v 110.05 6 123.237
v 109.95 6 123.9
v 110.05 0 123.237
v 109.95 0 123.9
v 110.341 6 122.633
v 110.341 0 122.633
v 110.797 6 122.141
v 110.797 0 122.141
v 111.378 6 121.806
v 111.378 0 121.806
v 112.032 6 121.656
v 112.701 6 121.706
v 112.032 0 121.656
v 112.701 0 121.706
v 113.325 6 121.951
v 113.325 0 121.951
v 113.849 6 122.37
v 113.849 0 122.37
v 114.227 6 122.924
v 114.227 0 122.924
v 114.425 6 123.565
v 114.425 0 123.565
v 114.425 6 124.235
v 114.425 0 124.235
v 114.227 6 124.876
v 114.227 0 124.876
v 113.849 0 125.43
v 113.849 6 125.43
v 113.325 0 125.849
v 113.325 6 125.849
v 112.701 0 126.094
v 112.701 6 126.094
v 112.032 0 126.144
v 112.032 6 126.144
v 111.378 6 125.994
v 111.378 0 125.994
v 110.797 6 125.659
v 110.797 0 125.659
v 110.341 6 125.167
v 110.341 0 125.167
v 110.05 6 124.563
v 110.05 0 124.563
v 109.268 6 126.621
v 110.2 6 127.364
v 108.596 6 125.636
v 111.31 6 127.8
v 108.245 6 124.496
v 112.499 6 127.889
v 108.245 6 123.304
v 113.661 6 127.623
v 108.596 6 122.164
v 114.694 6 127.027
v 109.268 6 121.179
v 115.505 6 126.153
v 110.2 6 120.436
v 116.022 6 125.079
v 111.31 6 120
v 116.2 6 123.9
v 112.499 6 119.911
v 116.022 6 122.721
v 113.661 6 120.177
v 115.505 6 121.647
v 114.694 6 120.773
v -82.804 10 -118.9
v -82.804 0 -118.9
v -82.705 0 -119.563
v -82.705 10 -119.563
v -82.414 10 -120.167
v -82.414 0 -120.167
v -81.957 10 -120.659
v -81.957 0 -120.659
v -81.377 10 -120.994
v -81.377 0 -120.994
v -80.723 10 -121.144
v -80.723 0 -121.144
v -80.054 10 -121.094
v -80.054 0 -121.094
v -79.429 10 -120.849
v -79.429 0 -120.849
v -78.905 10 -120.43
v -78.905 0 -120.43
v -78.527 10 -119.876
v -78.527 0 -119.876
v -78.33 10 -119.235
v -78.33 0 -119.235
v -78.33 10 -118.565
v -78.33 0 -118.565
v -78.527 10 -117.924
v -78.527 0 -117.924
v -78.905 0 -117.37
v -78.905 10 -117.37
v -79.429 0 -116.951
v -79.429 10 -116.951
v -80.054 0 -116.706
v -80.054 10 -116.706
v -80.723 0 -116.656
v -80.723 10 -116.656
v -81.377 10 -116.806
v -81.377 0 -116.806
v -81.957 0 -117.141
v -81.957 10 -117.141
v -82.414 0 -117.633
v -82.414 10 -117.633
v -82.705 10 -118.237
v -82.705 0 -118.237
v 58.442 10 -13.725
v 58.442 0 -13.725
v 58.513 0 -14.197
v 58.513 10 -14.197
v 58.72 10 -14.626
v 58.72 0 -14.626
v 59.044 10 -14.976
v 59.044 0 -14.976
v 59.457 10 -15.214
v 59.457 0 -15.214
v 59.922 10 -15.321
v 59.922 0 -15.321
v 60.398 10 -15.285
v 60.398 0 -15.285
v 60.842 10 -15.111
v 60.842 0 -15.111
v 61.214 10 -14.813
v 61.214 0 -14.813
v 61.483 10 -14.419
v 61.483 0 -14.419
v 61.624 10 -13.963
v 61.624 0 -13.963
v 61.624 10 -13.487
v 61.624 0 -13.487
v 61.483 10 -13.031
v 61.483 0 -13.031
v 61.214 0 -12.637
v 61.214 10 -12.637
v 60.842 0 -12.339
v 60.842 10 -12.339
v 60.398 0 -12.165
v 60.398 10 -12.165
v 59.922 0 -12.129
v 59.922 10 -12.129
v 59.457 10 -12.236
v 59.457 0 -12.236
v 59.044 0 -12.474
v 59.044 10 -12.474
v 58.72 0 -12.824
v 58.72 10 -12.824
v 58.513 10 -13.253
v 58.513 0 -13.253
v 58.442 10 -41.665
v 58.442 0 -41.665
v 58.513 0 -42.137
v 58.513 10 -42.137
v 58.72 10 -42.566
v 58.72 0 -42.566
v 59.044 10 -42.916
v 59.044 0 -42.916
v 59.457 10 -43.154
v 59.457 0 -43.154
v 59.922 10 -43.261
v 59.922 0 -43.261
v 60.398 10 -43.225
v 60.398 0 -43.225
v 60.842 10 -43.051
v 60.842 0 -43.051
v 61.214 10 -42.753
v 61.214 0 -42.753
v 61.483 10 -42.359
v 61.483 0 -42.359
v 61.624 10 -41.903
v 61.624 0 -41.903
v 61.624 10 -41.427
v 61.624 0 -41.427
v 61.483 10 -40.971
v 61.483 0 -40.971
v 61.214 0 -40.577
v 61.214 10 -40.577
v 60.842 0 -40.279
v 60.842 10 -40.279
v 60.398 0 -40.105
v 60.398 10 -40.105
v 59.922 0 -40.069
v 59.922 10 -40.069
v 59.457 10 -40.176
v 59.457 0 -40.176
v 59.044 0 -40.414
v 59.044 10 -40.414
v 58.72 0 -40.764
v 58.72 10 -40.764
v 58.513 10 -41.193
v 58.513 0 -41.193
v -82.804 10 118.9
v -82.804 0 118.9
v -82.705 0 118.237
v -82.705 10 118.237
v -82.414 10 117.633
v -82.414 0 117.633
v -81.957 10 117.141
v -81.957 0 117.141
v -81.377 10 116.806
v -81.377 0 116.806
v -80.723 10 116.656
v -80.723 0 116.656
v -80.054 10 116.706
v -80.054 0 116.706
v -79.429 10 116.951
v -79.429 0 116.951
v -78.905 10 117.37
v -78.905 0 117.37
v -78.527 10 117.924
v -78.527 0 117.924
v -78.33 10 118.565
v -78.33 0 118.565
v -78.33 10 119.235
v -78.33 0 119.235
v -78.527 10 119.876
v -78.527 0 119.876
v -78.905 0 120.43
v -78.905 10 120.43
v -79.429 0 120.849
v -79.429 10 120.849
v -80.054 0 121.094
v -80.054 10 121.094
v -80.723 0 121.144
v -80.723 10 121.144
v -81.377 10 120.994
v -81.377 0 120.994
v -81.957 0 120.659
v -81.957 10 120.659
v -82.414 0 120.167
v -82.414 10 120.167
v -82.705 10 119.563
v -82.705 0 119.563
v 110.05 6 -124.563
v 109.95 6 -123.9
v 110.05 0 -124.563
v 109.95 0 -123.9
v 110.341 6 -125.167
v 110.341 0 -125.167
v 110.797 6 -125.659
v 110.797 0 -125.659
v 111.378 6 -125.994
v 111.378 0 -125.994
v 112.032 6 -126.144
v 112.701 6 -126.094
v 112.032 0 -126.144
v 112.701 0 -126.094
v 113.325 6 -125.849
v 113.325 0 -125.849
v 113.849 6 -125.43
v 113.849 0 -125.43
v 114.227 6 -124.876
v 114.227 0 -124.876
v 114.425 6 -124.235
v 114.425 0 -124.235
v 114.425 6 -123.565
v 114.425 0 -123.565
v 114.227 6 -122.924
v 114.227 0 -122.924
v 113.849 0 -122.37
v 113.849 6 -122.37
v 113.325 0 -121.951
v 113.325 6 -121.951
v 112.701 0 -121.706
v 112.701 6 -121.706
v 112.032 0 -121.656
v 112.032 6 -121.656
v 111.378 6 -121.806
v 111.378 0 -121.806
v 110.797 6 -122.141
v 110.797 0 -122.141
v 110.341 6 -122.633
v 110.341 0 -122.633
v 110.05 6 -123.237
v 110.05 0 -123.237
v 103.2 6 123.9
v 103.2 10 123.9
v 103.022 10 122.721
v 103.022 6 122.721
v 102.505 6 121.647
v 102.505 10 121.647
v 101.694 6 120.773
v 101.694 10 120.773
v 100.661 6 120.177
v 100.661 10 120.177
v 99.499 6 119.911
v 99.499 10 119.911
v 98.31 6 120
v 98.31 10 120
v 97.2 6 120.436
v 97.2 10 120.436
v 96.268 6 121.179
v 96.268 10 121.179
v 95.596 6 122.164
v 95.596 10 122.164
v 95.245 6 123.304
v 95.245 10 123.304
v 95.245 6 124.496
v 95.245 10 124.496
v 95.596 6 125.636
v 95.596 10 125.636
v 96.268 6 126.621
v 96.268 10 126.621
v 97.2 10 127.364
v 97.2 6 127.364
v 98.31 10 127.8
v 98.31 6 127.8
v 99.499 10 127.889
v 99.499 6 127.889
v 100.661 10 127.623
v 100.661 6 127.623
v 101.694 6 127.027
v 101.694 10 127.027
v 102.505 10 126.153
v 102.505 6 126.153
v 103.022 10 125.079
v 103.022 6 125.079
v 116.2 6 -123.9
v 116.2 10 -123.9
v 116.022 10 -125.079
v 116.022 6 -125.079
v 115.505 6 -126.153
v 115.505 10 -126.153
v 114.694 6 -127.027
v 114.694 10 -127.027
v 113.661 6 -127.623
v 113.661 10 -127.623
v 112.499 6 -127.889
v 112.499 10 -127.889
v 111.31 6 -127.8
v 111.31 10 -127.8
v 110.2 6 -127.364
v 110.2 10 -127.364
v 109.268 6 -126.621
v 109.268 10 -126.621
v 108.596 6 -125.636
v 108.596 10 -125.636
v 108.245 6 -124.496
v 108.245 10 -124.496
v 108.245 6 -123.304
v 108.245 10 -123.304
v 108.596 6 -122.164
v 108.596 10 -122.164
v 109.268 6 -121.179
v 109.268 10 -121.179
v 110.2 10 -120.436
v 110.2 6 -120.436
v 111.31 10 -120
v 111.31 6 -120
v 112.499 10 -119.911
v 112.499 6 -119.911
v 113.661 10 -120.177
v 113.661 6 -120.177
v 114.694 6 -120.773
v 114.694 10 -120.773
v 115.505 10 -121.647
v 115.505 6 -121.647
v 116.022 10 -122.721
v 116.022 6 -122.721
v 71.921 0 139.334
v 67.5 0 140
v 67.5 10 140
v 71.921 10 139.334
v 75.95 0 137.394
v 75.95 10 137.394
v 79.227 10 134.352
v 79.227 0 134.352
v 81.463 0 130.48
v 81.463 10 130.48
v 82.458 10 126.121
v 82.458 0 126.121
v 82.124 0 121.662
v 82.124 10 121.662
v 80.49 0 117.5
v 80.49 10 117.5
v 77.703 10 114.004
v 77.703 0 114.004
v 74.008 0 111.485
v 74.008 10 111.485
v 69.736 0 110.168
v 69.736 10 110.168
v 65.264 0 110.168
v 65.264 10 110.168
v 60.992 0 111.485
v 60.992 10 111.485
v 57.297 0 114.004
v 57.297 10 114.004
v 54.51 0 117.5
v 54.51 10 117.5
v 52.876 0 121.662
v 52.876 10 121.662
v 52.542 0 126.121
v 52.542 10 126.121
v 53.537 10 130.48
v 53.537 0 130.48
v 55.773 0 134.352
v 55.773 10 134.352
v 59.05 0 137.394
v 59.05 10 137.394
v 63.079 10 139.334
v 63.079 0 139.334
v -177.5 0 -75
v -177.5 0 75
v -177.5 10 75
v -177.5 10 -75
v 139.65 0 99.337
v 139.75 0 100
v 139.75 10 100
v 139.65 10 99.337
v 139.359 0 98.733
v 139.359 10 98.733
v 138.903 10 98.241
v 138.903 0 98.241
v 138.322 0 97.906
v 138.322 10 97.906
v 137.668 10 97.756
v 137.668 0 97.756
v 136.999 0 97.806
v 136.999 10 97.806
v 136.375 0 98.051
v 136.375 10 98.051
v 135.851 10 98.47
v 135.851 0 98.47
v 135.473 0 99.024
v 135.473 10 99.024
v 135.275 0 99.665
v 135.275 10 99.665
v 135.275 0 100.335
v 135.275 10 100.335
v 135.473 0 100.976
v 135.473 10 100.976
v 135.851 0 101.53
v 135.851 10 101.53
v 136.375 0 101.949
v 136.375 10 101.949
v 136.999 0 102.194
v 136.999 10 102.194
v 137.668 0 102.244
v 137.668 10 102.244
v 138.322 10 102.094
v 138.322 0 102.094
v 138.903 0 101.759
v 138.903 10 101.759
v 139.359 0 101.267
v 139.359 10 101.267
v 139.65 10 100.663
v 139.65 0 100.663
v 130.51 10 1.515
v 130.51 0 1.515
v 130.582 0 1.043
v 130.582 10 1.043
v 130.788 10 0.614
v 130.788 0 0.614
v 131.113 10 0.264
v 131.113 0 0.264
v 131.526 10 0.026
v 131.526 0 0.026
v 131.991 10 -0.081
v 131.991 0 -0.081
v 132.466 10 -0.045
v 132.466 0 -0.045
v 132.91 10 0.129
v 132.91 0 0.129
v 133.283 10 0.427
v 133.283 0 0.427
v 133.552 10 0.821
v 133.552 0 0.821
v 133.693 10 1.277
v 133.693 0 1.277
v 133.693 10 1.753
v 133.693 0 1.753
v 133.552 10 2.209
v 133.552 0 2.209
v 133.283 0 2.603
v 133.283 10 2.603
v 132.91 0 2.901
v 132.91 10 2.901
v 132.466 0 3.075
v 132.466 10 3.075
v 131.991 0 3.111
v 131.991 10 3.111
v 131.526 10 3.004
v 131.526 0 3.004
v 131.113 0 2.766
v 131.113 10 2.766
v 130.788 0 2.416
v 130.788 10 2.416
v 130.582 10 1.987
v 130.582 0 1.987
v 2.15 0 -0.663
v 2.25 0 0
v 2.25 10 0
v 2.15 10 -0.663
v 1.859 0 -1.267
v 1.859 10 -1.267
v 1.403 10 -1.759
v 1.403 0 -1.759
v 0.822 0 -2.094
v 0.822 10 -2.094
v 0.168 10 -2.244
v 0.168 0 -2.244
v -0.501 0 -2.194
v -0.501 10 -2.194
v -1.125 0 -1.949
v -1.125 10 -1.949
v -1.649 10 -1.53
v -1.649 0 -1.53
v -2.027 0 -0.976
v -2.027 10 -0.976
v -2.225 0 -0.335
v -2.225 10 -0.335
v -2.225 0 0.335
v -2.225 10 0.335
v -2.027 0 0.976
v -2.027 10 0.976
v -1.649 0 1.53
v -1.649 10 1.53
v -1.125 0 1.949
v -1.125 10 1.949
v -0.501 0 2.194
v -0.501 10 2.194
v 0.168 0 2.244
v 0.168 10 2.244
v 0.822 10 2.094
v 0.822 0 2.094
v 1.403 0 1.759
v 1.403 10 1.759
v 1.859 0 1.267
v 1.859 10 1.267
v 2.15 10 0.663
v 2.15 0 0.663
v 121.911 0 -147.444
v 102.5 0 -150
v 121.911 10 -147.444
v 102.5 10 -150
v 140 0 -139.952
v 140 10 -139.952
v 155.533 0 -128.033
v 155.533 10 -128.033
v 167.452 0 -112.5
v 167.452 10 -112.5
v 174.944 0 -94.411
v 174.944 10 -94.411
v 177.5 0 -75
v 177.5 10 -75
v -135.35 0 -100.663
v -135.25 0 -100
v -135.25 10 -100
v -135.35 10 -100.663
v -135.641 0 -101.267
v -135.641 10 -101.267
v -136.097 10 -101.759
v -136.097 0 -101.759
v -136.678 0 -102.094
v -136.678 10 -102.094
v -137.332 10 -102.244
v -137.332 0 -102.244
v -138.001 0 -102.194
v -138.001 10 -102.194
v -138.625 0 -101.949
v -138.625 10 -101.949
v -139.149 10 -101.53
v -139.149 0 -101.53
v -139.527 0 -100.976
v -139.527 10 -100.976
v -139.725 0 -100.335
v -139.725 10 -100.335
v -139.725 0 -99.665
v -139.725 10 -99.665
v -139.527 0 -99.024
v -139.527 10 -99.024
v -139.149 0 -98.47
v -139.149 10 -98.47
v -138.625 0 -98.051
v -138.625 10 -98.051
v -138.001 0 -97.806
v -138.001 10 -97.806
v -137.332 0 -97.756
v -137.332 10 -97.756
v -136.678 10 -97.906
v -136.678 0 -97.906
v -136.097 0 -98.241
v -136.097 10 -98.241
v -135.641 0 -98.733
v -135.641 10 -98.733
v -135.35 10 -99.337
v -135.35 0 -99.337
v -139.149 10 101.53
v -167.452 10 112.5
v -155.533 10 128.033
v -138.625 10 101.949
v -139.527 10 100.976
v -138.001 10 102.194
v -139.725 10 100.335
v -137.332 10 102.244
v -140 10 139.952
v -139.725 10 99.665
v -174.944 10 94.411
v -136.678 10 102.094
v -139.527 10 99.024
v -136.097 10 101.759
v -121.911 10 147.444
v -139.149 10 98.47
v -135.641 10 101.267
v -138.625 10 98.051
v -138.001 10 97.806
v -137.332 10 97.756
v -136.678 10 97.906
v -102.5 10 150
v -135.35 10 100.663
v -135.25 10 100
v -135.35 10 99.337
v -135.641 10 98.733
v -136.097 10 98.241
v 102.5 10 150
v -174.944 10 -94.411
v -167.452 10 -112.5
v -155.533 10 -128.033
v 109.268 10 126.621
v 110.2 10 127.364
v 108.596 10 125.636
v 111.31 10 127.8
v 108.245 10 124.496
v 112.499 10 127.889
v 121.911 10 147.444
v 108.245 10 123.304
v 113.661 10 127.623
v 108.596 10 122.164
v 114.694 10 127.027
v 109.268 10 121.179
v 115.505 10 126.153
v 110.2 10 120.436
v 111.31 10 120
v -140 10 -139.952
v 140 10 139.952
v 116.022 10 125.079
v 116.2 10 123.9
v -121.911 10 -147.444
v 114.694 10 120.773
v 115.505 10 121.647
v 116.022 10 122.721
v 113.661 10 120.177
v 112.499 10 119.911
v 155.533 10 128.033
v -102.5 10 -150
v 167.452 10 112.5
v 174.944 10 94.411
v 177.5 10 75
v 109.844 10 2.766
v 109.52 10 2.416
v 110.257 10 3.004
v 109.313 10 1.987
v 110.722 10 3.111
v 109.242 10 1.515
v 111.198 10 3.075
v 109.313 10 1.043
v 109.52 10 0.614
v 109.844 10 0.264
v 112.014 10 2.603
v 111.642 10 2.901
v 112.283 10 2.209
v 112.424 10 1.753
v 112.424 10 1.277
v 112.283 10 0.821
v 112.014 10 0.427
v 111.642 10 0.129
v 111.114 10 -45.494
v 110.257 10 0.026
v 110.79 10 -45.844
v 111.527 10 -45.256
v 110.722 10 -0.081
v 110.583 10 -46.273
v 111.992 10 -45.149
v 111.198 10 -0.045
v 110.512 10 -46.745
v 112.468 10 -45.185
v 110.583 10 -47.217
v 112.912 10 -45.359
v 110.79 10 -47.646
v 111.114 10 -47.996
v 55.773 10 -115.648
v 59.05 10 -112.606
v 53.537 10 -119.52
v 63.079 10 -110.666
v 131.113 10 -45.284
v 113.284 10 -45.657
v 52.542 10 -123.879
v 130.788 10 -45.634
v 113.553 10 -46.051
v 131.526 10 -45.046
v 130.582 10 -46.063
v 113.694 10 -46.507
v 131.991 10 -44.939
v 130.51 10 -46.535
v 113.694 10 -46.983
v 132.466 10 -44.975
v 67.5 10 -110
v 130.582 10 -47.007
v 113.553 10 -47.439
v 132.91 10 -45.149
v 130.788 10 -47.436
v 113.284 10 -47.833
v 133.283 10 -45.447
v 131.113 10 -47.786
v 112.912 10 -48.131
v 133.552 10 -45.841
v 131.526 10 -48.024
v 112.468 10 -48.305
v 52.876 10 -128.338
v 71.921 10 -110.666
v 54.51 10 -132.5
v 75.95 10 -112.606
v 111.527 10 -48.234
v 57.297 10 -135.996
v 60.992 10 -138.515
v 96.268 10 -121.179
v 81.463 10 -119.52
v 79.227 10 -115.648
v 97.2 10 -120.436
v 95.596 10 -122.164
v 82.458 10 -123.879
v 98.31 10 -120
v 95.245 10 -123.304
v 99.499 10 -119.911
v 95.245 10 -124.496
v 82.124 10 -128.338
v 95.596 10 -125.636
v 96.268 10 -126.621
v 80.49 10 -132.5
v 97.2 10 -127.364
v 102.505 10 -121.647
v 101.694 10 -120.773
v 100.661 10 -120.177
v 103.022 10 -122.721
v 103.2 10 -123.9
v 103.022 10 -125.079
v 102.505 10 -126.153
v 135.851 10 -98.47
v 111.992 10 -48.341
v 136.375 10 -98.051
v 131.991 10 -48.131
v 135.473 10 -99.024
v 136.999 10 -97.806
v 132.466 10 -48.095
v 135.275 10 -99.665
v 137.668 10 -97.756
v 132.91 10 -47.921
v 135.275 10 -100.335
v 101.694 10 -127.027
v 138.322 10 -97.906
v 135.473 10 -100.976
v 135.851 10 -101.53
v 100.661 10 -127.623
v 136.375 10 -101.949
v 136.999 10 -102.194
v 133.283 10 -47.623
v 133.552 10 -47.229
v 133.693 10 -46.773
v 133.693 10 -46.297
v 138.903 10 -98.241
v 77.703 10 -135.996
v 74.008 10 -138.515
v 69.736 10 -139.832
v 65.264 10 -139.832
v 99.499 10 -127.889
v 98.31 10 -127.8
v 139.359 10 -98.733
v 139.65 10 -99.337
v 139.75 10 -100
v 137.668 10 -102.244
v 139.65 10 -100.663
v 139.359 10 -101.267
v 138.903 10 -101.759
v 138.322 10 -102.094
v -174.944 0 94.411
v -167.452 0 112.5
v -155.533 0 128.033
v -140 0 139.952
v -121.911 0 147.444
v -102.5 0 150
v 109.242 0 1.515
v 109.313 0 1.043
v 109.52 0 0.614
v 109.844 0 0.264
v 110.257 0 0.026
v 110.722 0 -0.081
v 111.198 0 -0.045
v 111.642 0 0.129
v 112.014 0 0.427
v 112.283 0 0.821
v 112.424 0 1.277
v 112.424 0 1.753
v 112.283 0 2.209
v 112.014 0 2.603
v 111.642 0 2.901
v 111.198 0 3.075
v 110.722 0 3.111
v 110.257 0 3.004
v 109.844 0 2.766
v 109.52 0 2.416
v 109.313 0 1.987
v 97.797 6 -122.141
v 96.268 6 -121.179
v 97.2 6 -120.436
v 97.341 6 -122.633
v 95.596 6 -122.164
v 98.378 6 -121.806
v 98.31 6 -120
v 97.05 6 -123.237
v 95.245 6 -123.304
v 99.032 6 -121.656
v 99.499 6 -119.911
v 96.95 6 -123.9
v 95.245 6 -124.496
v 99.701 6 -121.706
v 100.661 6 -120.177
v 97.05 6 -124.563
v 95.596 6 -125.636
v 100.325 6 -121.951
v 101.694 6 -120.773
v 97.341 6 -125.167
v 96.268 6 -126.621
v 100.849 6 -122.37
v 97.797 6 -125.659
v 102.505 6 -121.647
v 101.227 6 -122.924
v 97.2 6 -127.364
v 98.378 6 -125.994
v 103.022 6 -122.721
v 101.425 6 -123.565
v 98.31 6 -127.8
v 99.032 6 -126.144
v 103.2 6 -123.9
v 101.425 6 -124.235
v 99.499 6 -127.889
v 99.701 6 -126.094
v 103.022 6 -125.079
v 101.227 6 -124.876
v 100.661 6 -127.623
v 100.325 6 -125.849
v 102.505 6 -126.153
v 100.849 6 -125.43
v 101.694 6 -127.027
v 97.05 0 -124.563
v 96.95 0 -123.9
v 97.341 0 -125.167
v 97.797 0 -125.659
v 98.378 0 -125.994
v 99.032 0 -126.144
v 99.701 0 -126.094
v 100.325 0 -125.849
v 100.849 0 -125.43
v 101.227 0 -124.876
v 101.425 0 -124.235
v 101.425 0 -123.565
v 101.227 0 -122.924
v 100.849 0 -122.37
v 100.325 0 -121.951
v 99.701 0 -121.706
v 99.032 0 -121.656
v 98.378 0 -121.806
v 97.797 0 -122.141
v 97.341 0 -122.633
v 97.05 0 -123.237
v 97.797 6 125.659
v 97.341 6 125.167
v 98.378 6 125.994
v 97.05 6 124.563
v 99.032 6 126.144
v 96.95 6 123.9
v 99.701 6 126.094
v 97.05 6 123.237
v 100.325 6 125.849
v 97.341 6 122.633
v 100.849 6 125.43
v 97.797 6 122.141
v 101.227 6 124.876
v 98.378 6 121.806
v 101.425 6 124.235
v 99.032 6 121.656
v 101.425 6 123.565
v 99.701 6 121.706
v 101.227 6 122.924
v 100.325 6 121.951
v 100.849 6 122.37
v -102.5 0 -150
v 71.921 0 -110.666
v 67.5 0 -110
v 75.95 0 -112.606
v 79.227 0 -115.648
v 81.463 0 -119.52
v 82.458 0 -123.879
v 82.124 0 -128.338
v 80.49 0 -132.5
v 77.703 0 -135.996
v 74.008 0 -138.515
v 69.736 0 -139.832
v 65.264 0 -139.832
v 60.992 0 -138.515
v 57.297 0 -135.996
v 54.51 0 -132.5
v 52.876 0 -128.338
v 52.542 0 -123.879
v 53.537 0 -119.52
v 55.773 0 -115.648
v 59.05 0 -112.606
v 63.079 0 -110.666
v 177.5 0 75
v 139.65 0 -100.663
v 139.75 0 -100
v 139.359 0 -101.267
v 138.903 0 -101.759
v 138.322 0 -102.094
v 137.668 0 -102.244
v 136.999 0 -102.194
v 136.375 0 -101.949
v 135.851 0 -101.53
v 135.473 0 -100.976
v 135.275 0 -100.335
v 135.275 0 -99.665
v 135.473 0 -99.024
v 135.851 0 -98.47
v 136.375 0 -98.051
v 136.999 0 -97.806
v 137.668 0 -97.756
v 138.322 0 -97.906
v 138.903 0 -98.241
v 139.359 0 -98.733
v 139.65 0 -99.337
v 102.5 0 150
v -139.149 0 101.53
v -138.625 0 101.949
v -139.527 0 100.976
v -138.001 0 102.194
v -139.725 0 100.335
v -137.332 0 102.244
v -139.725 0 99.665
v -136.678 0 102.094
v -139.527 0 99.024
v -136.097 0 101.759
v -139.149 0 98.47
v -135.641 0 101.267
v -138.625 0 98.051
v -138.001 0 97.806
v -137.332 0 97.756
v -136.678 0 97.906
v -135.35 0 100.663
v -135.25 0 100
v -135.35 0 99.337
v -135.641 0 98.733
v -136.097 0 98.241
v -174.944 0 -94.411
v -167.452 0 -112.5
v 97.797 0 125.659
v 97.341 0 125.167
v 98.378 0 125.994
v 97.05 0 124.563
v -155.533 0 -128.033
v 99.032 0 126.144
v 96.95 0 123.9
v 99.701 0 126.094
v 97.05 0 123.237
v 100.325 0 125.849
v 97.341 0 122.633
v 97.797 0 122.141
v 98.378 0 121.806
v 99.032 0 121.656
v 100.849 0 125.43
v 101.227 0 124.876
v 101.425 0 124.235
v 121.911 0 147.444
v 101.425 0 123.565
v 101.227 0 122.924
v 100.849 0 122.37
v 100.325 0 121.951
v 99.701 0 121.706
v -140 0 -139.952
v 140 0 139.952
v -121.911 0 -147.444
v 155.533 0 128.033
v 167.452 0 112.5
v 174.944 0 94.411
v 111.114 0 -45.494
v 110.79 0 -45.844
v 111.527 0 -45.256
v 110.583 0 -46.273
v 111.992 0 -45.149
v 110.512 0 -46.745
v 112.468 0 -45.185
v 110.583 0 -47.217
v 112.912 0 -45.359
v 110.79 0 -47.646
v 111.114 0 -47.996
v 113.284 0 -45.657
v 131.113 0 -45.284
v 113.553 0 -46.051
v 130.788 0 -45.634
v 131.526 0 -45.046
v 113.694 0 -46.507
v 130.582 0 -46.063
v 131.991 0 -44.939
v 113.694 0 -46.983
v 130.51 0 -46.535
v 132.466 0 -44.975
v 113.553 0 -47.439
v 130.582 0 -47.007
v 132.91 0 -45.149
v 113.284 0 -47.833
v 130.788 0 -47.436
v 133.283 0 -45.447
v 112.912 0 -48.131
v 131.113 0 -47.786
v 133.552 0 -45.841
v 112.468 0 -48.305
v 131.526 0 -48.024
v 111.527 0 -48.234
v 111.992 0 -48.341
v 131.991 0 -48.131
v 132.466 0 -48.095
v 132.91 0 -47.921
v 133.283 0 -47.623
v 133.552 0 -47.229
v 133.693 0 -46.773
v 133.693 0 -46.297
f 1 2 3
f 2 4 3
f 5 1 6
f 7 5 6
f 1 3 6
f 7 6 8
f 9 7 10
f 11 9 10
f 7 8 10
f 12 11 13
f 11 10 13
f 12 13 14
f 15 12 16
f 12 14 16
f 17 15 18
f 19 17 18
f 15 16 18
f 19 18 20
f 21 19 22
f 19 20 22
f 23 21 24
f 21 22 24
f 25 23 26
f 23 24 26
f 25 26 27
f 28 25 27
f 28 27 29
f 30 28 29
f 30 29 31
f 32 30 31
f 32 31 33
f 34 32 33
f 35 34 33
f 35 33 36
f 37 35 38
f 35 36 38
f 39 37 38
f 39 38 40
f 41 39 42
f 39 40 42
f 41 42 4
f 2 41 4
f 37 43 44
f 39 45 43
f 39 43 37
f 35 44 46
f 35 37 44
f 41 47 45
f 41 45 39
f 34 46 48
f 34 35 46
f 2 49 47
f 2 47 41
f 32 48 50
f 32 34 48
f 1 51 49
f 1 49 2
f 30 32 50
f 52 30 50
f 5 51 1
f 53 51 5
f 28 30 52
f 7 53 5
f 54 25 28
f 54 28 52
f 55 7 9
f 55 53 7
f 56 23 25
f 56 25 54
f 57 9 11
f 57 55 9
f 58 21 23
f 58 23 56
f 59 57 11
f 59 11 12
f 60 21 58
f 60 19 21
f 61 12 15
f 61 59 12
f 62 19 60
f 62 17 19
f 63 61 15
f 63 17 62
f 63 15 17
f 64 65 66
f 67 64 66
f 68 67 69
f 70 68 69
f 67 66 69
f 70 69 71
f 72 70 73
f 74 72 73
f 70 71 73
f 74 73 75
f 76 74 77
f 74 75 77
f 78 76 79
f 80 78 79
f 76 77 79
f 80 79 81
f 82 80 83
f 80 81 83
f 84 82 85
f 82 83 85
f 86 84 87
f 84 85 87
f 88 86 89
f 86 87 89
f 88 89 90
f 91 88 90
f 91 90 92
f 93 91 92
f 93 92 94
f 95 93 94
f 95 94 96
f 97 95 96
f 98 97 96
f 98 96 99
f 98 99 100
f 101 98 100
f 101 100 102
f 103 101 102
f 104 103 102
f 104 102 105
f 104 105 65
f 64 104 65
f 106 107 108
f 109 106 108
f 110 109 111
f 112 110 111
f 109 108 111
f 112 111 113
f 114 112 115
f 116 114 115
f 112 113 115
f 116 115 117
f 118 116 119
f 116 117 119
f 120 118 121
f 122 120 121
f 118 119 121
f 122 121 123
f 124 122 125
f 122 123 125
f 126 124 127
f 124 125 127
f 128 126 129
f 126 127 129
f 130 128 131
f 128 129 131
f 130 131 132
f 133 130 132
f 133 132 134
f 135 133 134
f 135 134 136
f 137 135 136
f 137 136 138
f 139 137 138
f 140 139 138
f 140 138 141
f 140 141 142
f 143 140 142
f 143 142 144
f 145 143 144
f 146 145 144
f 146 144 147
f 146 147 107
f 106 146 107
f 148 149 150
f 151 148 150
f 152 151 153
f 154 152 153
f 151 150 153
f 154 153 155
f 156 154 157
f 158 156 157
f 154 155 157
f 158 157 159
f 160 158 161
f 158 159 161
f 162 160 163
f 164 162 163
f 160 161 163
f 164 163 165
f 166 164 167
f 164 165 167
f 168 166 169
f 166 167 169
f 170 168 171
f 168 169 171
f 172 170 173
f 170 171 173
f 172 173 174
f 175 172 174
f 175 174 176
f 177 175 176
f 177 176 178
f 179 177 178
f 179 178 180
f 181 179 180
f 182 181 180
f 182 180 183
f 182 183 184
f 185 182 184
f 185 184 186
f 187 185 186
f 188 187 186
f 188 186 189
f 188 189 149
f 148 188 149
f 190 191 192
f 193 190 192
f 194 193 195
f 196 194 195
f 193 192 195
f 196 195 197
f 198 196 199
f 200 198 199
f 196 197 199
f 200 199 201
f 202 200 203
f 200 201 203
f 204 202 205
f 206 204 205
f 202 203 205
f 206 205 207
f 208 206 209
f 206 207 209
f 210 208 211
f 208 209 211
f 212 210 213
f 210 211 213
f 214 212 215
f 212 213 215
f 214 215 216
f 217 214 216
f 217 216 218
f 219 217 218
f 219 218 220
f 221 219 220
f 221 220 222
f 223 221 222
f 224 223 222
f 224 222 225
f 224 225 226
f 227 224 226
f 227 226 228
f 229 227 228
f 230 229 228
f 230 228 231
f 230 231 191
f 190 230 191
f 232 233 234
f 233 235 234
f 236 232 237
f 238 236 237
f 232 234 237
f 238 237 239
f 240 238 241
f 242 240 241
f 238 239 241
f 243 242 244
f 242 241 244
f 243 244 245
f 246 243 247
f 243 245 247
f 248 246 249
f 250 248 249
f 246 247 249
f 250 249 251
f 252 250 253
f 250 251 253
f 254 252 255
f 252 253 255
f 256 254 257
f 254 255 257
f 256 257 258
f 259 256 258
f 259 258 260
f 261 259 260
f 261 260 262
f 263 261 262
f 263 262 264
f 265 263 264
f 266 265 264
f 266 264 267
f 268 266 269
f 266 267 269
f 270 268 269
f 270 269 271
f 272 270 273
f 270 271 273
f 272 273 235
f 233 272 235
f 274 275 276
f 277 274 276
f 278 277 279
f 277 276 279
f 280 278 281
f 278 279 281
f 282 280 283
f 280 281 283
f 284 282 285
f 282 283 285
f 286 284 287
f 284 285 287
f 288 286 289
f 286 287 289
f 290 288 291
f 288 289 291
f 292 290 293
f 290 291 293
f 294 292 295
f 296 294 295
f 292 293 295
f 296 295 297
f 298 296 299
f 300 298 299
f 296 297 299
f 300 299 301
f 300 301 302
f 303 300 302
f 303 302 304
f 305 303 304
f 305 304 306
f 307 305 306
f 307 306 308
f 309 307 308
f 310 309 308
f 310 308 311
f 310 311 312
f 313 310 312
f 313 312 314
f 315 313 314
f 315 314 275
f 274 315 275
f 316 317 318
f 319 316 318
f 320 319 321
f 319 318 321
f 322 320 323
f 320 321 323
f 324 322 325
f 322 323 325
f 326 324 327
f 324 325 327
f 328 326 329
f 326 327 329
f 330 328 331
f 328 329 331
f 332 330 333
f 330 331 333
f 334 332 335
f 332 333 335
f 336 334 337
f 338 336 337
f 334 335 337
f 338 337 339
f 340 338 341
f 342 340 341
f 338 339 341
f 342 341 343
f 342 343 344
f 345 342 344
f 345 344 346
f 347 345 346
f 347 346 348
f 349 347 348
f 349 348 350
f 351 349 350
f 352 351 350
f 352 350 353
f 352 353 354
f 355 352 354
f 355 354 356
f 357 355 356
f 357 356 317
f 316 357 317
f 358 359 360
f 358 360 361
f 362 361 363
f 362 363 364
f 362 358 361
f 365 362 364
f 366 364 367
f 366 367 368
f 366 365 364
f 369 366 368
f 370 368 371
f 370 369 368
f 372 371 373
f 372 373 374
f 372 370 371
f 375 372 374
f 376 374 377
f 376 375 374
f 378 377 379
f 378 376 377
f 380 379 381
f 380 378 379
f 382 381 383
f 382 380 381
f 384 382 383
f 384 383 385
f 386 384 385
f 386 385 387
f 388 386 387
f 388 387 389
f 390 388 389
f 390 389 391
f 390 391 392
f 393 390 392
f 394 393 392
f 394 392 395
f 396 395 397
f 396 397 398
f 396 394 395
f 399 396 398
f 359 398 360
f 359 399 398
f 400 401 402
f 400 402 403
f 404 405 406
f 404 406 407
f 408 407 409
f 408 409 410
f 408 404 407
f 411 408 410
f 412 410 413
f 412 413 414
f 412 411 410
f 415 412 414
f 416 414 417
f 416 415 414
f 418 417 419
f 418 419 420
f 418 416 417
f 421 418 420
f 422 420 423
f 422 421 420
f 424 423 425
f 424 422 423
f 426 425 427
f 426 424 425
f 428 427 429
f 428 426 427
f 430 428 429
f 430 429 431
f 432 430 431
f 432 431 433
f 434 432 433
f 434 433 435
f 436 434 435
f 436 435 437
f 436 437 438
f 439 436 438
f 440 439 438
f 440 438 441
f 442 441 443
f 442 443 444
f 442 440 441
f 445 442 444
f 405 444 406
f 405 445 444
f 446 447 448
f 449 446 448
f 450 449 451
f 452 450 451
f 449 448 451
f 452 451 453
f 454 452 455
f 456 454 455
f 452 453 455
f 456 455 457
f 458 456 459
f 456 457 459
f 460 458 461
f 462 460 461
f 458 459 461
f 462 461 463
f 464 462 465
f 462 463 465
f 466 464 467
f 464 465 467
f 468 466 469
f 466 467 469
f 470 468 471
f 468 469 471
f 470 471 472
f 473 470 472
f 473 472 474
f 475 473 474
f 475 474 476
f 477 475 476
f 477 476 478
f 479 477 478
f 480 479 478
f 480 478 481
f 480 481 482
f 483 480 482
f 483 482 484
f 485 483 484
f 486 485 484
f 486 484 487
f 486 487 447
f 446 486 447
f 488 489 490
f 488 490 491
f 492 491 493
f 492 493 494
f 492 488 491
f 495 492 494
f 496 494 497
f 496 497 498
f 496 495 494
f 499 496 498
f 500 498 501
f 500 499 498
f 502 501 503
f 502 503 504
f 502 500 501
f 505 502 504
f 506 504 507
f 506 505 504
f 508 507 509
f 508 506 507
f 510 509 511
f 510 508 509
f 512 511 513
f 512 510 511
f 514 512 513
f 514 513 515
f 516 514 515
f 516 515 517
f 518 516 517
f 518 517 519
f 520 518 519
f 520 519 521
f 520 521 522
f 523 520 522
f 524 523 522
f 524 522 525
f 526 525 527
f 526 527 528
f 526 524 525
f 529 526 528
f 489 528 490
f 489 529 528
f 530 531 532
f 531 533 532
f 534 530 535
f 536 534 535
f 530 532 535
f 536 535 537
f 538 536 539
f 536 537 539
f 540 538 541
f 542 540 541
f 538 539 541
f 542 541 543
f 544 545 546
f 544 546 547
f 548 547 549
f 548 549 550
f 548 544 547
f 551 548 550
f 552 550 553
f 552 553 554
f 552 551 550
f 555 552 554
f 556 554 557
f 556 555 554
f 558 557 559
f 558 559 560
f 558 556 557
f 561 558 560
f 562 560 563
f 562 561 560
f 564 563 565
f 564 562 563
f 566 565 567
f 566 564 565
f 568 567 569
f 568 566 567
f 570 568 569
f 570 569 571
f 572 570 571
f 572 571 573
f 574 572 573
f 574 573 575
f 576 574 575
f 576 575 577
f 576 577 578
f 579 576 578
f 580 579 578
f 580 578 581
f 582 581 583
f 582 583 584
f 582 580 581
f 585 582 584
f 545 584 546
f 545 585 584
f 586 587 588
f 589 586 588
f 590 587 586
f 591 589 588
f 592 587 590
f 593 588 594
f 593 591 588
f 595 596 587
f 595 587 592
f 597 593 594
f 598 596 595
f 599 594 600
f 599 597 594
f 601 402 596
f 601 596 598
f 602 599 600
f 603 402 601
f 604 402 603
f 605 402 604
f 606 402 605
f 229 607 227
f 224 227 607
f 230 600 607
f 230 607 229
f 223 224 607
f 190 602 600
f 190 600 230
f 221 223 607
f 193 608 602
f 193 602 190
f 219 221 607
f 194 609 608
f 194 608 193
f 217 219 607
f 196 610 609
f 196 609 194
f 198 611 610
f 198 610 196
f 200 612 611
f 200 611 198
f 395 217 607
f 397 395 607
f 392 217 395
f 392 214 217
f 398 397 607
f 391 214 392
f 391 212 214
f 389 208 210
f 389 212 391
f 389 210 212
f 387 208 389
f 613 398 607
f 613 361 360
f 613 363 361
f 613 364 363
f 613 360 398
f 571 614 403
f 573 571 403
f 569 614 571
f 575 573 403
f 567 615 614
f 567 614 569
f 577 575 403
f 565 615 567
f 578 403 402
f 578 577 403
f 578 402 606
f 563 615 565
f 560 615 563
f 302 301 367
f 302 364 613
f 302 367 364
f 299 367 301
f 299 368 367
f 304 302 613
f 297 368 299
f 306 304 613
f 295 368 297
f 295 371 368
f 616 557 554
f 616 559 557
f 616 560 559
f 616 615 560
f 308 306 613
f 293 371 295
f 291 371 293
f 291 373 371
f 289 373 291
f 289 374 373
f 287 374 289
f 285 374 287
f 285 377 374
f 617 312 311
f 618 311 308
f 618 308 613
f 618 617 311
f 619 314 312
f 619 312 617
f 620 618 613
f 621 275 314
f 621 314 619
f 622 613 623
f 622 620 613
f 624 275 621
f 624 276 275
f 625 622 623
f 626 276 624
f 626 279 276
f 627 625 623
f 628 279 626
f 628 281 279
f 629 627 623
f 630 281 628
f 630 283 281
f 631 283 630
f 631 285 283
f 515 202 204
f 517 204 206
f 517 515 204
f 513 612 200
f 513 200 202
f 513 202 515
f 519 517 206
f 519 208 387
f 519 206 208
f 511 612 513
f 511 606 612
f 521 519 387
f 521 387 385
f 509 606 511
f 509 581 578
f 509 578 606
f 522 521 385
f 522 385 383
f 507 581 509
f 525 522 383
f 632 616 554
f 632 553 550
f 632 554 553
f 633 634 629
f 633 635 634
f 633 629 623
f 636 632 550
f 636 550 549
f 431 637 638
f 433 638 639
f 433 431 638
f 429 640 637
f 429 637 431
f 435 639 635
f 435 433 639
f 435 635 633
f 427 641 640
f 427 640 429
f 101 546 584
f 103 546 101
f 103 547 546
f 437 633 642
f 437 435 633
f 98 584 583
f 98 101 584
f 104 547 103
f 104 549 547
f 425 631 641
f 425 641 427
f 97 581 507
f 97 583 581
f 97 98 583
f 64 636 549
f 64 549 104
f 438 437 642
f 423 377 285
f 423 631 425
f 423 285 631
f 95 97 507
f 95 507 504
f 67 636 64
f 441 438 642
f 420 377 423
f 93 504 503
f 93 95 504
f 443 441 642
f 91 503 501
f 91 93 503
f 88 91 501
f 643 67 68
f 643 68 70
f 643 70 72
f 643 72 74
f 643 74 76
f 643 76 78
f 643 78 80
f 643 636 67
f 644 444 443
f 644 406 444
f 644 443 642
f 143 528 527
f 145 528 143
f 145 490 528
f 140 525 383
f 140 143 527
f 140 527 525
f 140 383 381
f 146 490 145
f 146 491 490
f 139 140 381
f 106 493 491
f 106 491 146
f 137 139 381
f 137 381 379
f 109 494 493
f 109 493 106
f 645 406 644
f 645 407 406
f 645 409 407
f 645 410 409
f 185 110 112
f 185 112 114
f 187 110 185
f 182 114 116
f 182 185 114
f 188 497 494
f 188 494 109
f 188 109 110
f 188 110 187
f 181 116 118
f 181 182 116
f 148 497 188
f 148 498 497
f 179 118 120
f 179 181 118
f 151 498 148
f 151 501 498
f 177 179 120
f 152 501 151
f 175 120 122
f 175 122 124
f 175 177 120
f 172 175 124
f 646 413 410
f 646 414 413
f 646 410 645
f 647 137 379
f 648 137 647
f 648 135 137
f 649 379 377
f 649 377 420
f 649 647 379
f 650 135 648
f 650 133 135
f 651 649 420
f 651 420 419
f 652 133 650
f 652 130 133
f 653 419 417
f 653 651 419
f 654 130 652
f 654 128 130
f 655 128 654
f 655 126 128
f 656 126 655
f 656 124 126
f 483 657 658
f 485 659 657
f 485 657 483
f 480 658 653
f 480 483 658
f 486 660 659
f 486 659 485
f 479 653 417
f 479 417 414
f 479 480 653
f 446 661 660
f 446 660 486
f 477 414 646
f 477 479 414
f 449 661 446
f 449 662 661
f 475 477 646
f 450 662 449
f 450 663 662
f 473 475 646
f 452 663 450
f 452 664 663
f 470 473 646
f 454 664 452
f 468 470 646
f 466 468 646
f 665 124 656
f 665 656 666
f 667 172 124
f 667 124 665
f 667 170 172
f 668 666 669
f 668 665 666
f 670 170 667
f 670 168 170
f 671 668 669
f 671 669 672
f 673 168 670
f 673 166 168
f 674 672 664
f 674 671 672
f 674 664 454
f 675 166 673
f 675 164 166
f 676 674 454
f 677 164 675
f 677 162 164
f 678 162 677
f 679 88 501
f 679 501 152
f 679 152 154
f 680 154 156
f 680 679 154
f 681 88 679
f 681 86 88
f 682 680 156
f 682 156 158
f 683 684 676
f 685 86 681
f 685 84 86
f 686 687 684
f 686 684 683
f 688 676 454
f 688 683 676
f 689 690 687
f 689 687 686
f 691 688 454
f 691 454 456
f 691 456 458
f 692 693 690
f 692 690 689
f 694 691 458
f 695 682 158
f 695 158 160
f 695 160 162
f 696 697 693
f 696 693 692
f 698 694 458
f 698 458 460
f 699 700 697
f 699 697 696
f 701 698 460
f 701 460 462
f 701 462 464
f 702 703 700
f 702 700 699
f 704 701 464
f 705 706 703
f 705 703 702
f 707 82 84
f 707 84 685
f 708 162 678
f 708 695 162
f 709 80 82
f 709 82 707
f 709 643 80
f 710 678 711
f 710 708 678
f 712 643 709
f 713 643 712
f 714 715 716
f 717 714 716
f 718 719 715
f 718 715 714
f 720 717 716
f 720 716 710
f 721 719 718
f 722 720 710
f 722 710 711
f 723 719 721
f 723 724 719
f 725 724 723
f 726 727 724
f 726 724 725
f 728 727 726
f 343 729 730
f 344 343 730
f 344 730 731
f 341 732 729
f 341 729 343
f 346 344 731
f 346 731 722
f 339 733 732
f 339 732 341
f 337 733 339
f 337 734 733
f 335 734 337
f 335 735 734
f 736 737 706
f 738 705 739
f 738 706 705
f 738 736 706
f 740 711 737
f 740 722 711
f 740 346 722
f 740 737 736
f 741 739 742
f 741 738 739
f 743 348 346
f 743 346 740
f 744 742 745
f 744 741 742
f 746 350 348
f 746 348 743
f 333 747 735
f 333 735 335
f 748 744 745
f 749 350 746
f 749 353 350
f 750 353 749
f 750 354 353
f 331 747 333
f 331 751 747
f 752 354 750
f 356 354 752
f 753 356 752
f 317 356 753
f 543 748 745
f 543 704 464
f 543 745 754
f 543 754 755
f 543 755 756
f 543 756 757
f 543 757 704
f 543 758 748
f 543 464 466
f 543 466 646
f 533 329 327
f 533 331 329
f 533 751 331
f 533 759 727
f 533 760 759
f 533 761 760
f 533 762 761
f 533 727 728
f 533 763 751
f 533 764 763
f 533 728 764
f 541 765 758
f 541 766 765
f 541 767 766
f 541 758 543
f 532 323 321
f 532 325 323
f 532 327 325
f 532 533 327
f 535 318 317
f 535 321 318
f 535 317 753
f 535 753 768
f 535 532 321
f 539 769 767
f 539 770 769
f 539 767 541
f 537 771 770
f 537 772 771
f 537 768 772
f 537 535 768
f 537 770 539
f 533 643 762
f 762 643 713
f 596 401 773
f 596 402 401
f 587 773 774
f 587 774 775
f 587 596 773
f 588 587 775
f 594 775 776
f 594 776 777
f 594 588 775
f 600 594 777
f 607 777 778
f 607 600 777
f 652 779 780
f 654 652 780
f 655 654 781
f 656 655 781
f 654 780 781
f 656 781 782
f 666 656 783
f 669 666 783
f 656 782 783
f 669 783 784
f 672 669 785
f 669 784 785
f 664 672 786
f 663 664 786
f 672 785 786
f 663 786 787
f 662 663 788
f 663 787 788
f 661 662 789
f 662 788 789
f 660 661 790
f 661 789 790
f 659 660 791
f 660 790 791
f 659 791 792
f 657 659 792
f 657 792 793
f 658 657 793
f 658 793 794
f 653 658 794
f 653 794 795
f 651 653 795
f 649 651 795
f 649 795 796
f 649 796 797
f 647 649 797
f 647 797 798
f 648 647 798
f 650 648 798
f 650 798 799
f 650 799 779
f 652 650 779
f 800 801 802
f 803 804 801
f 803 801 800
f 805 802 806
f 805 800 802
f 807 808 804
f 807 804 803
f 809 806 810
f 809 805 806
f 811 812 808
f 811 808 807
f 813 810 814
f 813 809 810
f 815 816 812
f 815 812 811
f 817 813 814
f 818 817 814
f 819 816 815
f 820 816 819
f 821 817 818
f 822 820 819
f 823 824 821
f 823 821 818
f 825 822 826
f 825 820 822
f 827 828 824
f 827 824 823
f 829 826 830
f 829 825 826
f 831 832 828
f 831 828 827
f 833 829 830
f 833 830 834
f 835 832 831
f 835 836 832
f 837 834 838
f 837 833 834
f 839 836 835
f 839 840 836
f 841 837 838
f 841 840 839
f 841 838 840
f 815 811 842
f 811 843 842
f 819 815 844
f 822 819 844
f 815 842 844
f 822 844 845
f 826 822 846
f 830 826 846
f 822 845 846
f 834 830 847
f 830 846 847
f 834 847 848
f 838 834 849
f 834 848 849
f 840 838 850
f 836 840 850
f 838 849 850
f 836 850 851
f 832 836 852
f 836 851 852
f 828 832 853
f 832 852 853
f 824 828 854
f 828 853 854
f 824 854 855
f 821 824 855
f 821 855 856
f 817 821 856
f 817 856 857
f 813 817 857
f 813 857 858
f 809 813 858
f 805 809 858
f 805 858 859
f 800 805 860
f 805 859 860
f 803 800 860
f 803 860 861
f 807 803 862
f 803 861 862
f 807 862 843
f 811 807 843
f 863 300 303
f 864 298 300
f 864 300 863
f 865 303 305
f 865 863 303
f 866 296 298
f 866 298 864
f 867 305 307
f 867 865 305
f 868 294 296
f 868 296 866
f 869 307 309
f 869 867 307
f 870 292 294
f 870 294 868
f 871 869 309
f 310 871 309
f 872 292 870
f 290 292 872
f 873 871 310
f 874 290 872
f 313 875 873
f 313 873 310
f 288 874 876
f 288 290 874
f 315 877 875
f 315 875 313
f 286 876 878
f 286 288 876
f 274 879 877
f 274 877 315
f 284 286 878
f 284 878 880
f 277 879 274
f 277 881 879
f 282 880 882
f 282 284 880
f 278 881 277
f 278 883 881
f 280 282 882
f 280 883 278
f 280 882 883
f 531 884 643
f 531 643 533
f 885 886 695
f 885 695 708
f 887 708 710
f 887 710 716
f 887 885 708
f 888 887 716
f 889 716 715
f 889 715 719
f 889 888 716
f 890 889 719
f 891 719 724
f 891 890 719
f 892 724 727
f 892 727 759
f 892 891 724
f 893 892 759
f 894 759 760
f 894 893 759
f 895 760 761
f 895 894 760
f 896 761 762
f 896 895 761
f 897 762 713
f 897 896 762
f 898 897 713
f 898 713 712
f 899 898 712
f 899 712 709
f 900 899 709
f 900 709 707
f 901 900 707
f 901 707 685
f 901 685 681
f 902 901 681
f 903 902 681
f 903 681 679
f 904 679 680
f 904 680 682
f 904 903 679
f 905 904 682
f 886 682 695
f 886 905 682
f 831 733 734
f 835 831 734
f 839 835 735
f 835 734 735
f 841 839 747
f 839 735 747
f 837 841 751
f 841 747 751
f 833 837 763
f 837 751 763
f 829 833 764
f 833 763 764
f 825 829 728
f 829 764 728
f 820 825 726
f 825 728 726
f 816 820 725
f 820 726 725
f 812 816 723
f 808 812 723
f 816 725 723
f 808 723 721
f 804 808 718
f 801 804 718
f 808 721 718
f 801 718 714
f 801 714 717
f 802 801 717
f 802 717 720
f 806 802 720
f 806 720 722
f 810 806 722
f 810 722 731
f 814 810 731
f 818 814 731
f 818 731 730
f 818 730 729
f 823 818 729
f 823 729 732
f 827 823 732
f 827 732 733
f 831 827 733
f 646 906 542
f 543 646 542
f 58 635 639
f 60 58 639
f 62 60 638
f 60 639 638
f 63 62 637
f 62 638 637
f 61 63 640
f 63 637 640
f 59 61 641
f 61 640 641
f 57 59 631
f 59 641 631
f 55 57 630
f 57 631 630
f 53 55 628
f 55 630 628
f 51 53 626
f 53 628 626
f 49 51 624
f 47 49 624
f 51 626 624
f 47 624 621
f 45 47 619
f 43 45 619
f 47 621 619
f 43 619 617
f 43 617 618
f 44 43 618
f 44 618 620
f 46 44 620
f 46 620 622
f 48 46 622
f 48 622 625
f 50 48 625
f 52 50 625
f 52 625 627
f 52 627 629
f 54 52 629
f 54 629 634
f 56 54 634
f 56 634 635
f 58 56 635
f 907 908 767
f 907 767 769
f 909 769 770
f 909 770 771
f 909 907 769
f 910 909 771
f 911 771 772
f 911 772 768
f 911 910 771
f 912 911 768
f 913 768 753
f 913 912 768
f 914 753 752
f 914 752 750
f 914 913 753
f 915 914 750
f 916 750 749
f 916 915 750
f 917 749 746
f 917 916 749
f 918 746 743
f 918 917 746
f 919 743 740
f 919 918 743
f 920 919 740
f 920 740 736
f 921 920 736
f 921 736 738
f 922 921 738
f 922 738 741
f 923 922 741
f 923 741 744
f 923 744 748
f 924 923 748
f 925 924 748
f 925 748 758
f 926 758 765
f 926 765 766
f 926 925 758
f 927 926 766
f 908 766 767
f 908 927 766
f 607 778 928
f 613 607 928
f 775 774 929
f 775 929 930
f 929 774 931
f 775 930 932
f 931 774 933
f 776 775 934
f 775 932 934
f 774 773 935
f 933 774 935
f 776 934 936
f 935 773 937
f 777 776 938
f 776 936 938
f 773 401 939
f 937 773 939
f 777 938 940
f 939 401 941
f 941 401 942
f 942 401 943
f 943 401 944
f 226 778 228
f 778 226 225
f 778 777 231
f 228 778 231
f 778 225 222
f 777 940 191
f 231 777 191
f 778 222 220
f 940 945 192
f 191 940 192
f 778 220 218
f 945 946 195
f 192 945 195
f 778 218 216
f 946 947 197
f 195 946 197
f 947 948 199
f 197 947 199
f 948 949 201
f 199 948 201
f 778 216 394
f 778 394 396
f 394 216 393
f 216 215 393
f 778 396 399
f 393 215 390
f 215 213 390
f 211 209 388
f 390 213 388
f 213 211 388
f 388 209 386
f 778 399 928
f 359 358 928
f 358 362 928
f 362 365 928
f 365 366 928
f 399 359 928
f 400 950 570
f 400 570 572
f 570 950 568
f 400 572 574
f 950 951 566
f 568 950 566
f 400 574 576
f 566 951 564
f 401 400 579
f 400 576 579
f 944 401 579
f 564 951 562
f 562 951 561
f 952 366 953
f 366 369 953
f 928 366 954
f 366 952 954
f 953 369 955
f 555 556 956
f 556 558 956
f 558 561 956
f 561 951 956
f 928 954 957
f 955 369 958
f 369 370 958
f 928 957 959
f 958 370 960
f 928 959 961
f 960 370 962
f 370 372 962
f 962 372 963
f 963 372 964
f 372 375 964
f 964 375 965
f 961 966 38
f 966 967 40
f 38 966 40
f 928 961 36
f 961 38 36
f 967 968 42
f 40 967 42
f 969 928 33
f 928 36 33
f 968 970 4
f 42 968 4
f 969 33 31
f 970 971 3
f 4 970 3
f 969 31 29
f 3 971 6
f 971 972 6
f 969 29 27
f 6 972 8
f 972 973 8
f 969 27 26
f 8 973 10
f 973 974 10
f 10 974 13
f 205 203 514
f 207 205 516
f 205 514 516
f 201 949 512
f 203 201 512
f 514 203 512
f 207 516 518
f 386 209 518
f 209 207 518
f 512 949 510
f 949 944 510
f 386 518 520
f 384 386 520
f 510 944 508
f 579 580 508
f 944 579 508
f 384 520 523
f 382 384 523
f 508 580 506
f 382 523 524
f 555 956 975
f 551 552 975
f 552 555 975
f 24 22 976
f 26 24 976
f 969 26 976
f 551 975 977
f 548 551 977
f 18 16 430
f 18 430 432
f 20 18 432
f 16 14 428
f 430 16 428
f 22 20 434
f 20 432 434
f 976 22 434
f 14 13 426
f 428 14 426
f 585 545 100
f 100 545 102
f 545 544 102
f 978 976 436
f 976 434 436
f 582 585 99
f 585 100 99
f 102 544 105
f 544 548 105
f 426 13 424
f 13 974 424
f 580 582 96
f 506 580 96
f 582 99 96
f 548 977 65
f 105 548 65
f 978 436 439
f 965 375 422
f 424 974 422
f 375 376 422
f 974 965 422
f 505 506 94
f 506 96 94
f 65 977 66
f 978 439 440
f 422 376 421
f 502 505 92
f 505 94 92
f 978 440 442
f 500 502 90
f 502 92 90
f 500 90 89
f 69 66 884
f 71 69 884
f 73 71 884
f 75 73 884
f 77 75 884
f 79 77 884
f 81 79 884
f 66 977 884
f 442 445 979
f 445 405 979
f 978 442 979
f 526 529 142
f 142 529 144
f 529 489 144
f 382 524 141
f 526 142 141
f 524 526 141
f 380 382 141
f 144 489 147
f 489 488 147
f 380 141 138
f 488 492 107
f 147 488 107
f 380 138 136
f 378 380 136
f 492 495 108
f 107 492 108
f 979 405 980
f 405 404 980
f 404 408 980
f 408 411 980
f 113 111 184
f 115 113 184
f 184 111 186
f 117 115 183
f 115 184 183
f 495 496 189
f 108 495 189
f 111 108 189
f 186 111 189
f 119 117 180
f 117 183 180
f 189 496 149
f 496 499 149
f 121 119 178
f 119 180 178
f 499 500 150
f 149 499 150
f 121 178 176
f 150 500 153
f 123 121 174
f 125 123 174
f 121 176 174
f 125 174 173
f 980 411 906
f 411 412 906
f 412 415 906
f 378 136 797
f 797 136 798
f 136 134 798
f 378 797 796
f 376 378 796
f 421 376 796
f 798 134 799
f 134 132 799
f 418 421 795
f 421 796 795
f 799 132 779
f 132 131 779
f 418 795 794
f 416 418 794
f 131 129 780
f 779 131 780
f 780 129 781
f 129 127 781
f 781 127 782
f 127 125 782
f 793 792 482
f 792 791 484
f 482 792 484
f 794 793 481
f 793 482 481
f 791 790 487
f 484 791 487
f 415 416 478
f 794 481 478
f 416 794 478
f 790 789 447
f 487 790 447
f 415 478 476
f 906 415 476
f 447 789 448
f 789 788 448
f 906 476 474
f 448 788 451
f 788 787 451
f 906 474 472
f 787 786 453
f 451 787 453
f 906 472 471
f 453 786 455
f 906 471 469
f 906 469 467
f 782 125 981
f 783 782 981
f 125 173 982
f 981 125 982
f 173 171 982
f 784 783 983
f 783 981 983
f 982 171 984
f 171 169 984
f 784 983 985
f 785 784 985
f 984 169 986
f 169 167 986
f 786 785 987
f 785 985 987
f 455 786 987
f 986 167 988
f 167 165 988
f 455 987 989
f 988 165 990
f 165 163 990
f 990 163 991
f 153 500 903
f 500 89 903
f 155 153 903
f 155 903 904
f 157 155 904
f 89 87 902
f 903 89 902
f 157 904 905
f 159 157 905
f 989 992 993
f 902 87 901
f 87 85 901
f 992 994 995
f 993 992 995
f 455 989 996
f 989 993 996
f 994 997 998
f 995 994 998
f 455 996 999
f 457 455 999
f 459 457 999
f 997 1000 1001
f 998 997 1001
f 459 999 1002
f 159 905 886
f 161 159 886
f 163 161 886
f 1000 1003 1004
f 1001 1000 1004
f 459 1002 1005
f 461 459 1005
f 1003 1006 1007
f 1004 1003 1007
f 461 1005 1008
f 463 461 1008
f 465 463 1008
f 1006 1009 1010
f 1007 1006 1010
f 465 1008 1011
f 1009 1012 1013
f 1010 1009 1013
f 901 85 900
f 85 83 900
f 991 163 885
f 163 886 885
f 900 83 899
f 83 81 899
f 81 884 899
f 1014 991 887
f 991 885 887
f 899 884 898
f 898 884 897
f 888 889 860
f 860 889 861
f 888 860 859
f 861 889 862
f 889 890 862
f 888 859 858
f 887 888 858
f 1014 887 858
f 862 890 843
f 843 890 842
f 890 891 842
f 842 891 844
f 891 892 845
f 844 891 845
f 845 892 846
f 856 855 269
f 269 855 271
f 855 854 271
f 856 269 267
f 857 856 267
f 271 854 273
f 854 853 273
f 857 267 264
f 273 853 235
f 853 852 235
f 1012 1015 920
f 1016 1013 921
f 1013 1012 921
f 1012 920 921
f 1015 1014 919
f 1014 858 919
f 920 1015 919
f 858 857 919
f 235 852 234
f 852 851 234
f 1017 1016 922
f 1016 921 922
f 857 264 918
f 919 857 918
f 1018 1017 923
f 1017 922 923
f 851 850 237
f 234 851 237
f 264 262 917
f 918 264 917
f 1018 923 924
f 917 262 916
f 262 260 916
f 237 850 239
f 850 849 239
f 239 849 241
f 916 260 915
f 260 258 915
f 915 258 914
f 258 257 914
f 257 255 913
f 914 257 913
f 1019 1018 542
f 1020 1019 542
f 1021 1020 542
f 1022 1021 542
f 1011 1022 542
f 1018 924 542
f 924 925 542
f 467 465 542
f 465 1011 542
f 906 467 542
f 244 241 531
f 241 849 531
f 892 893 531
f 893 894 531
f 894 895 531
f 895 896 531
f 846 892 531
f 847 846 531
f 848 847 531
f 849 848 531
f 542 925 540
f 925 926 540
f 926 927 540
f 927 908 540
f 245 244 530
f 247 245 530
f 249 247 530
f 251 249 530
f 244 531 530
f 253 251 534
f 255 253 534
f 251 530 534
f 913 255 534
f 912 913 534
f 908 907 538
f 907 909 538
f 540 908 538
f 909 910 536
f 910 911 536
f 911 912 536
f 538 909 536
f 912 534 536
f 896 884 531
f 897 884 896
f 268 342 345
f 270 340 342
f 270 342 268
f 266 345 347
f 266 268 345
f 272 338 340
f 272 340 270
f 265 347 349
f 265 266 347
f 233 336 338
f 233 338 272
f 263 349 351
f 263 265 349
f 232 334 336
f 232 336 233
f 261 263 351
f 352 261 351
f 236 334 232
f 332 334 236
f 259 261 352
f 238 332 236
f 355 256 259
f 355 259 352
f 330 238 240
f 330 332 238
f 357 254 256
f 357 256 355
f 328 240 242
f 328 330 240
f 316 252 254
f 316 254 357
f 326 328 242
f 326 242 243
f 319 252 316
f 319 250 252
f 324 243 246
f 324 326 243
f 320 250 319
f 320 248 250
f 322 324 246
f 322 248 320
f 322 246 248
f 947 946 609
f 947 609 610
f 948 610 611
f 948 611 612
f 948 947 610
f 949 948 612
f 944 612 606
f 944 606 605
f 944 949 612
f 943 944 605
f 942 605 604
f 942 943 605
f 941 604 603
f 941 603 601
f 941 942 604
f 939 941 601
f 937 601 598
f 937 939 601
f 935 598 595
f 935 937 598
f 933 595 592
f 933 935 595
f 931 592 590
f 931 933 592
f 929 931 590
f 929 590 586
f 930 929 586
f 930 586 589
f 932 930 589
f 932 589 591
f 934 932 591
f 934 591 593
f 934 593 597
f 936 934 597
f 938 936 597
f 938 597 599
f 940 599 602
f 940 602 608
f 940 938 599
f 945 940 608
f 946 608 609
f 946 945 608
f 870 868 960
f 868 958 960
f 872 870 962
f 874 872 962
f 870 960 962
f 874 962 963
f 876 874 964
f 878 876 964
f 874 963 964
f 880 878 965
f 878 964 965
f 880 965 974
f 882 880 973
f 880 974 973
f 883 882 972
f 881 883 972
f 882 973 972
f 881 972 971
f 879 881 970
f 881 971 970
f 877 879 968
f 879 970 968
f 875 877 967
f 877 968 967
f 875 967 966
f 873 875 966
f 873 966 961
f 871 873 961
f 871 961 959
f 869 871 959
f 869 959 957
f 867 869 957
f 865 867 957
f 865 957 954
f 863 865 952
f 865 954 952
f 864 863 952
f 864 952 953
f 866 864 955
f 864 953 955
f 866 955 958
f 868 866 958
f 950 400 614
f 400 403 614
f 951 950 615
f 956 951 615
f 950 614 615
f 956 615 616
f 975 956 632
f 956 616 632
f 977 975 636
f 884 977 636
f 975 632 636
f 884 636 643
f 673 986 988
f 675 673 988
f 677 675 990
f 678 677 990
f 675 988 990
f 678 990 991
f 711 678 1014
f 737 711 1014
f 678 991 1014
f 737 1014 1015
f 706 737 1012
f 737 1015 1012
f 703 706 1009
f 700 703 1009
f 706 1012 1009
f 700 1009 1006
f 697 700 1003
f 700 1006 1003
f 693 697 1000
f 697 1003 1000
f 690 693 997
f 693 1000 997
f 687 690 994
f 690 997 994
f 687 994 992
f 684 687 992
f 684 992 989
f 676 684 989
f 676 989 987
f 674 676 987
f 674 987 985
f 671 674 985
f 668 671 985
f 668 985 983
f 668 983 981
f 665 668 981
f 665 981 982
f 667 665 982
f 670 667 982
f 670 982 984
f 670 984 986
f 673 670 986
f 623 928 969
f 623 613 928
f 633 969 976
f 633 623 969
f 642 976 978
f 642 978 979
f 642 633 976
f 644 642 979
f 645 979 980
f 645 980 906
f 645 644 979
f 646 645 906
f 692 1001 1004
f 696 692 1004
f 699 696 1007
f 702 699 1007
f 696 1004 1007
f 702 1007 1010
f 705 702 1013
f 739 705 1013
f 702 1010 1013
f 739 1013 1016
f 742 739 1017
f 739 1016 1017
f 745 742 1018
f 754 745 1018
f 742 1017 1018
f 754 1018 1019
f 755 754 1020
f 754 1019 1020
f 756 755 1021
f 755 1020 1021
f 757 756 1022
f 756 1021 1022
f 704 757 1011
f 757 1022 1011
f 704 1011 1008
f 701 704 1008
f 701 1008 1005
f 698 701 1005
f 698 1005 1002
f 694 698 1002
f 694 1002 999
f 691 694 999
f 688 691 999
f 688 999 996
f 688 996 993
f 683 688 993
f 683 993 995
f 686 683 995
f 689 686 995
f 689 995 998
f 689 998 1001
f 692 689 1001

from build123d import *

# Parameters (mm, degrees)
SKETCH11_W                     = 355
SKETCH11_H                     = 300
SKETCH11_R                     = 15
BOSS_EXTRUDE2_DEPTH            = 10
CBORE_FOR_M4_SHCS2_D           = 4.5
CBORE_FOR_M4_SHCS2_CBORE_D     = 8
CBORE_FOR_M4_SHCS2_CBORE_DEPTH = 4
F_3_2_3_2_DIAMETER_HOLE2_D     = 3.2
M4_CLEARANCE_HOLE1_OUTLINE_R   = 2.25
M4_CLEARANCE_HOLE1_DEPTH       = 10
M4_CLEARANCE_HOLE2_D           = 4.5
FILLET1_R                      = 75


# Read off the part's stored shape, not the designer's step: M4 Clearance Hole1
with BuildPart() as part:
    # Sketch11 → Boss-Extrude2 (new body)
    with BuildSketch(Plane(origin=(0, 0, 0), x_dir=(1, 0, 0), z_dir=(0, 1, 0))):
        Rectangle(SKETCH11_W, SKETCH11_H)
        with Locations(Location((67.5, -125, 0), (0, 0, 270))):
            Circle(SKETCH11_R, mode=Mode.SUBTRACT)
        with Locations(Location((67.5, 125, 0), (0, 0, 270))):
            Circle(SKETCH11_R, mode=Mode.SUBTRACT)
    extrude(amount=BOSS_EXTRUDE2_DEPTH)

    # CBORE for M4 SHCS2 (through all)
    with Locations(Plane(origin=(0, 10, 0), x_dir=(1, 0, 0), z_dir=(0, 1, 0))):
        with Locations((99.2, 123.9), (112.2, 123.9), (112.2, -123.9), (99.2, -123.9)):
            CounterBoreHole(CBORE_FOR_M4_SHCS2_D / 2, CBORE_FOR_M4_SHCS2_CBORE_D / 2, CBORE_FOR_M4_SHCS2_CBORE_DEPTH)

    # Ø3.2 (3.2) Diameter Hole2 (through all)
    with Locations(Plane(origin=(0, 10, 0), x_dir=(1, 0, 0), z_dir=(0, 1, 0))):
        with Locations((132.110460528, 46.535002739), (112.111563058, 46.745002739), (110.841563058, -1.514997261), (132.110460528, -1.514997261), (60.041563058, 13.725002739), (60.041563058, 41.665002739)):
            Hole(F_3_2_3_2_DIAMETER_HOLE2_D / 2)

    # M4 Clearance Hole1 outline → M4 Clearance Hole1 (cut)
    with BuildSketch(Plane(origin=(0, 0, 0), x_dir=(1, 0, 0), z_dir=(0, 1, 0))):
        with Locations((137.5, 100)):
            Circle(M4_CLEARANCE_HOLE1_OUTLINE_R)
        with Locations((-137.5, -100)):
            Circle(M4_CLEARANCE_HOLE1_OUTLINE_R)
        with Locations((-137.5, 100)):
            Circle(M4_CLEARANCE_HOLE1_OUTLINE_R)
        with Locations((137.5, -100)):
            Circle(M4_CLEARANCE_HOLE1_OUTLINE_R)
        Circle(M4_CLEARANCE_HOLE1_OUTLINE_R)
    extrude(amount=M4_CLEARANCE_HOLE1_DEPTH, mode=Mode.SUBTRACT)

    # M4 Clearance Hole2 (through all)
    with Locations(Plane(origin=(0, 10, 0), x_dir=(1, 0, 0), z_dir=(0, 1, 0))):
        with Locations((-80.554499739, -118.9), (-80.554499739, 118.9)):
            Hole(M4_CLEARANCE_HOLE2_D / 2)

    # Fillet1
    fillet1_edges = [part.edges().sort_by_distance(p)[0] for p in [
        (177.5, 5, -150),
        (177.5, 5, 150),
        (-177.5, 5, 150),
        (-177.5, 5, -150),
    ]]
    fillet(fillet1_edges, radius=FILLET1_R)


solid = part.part
